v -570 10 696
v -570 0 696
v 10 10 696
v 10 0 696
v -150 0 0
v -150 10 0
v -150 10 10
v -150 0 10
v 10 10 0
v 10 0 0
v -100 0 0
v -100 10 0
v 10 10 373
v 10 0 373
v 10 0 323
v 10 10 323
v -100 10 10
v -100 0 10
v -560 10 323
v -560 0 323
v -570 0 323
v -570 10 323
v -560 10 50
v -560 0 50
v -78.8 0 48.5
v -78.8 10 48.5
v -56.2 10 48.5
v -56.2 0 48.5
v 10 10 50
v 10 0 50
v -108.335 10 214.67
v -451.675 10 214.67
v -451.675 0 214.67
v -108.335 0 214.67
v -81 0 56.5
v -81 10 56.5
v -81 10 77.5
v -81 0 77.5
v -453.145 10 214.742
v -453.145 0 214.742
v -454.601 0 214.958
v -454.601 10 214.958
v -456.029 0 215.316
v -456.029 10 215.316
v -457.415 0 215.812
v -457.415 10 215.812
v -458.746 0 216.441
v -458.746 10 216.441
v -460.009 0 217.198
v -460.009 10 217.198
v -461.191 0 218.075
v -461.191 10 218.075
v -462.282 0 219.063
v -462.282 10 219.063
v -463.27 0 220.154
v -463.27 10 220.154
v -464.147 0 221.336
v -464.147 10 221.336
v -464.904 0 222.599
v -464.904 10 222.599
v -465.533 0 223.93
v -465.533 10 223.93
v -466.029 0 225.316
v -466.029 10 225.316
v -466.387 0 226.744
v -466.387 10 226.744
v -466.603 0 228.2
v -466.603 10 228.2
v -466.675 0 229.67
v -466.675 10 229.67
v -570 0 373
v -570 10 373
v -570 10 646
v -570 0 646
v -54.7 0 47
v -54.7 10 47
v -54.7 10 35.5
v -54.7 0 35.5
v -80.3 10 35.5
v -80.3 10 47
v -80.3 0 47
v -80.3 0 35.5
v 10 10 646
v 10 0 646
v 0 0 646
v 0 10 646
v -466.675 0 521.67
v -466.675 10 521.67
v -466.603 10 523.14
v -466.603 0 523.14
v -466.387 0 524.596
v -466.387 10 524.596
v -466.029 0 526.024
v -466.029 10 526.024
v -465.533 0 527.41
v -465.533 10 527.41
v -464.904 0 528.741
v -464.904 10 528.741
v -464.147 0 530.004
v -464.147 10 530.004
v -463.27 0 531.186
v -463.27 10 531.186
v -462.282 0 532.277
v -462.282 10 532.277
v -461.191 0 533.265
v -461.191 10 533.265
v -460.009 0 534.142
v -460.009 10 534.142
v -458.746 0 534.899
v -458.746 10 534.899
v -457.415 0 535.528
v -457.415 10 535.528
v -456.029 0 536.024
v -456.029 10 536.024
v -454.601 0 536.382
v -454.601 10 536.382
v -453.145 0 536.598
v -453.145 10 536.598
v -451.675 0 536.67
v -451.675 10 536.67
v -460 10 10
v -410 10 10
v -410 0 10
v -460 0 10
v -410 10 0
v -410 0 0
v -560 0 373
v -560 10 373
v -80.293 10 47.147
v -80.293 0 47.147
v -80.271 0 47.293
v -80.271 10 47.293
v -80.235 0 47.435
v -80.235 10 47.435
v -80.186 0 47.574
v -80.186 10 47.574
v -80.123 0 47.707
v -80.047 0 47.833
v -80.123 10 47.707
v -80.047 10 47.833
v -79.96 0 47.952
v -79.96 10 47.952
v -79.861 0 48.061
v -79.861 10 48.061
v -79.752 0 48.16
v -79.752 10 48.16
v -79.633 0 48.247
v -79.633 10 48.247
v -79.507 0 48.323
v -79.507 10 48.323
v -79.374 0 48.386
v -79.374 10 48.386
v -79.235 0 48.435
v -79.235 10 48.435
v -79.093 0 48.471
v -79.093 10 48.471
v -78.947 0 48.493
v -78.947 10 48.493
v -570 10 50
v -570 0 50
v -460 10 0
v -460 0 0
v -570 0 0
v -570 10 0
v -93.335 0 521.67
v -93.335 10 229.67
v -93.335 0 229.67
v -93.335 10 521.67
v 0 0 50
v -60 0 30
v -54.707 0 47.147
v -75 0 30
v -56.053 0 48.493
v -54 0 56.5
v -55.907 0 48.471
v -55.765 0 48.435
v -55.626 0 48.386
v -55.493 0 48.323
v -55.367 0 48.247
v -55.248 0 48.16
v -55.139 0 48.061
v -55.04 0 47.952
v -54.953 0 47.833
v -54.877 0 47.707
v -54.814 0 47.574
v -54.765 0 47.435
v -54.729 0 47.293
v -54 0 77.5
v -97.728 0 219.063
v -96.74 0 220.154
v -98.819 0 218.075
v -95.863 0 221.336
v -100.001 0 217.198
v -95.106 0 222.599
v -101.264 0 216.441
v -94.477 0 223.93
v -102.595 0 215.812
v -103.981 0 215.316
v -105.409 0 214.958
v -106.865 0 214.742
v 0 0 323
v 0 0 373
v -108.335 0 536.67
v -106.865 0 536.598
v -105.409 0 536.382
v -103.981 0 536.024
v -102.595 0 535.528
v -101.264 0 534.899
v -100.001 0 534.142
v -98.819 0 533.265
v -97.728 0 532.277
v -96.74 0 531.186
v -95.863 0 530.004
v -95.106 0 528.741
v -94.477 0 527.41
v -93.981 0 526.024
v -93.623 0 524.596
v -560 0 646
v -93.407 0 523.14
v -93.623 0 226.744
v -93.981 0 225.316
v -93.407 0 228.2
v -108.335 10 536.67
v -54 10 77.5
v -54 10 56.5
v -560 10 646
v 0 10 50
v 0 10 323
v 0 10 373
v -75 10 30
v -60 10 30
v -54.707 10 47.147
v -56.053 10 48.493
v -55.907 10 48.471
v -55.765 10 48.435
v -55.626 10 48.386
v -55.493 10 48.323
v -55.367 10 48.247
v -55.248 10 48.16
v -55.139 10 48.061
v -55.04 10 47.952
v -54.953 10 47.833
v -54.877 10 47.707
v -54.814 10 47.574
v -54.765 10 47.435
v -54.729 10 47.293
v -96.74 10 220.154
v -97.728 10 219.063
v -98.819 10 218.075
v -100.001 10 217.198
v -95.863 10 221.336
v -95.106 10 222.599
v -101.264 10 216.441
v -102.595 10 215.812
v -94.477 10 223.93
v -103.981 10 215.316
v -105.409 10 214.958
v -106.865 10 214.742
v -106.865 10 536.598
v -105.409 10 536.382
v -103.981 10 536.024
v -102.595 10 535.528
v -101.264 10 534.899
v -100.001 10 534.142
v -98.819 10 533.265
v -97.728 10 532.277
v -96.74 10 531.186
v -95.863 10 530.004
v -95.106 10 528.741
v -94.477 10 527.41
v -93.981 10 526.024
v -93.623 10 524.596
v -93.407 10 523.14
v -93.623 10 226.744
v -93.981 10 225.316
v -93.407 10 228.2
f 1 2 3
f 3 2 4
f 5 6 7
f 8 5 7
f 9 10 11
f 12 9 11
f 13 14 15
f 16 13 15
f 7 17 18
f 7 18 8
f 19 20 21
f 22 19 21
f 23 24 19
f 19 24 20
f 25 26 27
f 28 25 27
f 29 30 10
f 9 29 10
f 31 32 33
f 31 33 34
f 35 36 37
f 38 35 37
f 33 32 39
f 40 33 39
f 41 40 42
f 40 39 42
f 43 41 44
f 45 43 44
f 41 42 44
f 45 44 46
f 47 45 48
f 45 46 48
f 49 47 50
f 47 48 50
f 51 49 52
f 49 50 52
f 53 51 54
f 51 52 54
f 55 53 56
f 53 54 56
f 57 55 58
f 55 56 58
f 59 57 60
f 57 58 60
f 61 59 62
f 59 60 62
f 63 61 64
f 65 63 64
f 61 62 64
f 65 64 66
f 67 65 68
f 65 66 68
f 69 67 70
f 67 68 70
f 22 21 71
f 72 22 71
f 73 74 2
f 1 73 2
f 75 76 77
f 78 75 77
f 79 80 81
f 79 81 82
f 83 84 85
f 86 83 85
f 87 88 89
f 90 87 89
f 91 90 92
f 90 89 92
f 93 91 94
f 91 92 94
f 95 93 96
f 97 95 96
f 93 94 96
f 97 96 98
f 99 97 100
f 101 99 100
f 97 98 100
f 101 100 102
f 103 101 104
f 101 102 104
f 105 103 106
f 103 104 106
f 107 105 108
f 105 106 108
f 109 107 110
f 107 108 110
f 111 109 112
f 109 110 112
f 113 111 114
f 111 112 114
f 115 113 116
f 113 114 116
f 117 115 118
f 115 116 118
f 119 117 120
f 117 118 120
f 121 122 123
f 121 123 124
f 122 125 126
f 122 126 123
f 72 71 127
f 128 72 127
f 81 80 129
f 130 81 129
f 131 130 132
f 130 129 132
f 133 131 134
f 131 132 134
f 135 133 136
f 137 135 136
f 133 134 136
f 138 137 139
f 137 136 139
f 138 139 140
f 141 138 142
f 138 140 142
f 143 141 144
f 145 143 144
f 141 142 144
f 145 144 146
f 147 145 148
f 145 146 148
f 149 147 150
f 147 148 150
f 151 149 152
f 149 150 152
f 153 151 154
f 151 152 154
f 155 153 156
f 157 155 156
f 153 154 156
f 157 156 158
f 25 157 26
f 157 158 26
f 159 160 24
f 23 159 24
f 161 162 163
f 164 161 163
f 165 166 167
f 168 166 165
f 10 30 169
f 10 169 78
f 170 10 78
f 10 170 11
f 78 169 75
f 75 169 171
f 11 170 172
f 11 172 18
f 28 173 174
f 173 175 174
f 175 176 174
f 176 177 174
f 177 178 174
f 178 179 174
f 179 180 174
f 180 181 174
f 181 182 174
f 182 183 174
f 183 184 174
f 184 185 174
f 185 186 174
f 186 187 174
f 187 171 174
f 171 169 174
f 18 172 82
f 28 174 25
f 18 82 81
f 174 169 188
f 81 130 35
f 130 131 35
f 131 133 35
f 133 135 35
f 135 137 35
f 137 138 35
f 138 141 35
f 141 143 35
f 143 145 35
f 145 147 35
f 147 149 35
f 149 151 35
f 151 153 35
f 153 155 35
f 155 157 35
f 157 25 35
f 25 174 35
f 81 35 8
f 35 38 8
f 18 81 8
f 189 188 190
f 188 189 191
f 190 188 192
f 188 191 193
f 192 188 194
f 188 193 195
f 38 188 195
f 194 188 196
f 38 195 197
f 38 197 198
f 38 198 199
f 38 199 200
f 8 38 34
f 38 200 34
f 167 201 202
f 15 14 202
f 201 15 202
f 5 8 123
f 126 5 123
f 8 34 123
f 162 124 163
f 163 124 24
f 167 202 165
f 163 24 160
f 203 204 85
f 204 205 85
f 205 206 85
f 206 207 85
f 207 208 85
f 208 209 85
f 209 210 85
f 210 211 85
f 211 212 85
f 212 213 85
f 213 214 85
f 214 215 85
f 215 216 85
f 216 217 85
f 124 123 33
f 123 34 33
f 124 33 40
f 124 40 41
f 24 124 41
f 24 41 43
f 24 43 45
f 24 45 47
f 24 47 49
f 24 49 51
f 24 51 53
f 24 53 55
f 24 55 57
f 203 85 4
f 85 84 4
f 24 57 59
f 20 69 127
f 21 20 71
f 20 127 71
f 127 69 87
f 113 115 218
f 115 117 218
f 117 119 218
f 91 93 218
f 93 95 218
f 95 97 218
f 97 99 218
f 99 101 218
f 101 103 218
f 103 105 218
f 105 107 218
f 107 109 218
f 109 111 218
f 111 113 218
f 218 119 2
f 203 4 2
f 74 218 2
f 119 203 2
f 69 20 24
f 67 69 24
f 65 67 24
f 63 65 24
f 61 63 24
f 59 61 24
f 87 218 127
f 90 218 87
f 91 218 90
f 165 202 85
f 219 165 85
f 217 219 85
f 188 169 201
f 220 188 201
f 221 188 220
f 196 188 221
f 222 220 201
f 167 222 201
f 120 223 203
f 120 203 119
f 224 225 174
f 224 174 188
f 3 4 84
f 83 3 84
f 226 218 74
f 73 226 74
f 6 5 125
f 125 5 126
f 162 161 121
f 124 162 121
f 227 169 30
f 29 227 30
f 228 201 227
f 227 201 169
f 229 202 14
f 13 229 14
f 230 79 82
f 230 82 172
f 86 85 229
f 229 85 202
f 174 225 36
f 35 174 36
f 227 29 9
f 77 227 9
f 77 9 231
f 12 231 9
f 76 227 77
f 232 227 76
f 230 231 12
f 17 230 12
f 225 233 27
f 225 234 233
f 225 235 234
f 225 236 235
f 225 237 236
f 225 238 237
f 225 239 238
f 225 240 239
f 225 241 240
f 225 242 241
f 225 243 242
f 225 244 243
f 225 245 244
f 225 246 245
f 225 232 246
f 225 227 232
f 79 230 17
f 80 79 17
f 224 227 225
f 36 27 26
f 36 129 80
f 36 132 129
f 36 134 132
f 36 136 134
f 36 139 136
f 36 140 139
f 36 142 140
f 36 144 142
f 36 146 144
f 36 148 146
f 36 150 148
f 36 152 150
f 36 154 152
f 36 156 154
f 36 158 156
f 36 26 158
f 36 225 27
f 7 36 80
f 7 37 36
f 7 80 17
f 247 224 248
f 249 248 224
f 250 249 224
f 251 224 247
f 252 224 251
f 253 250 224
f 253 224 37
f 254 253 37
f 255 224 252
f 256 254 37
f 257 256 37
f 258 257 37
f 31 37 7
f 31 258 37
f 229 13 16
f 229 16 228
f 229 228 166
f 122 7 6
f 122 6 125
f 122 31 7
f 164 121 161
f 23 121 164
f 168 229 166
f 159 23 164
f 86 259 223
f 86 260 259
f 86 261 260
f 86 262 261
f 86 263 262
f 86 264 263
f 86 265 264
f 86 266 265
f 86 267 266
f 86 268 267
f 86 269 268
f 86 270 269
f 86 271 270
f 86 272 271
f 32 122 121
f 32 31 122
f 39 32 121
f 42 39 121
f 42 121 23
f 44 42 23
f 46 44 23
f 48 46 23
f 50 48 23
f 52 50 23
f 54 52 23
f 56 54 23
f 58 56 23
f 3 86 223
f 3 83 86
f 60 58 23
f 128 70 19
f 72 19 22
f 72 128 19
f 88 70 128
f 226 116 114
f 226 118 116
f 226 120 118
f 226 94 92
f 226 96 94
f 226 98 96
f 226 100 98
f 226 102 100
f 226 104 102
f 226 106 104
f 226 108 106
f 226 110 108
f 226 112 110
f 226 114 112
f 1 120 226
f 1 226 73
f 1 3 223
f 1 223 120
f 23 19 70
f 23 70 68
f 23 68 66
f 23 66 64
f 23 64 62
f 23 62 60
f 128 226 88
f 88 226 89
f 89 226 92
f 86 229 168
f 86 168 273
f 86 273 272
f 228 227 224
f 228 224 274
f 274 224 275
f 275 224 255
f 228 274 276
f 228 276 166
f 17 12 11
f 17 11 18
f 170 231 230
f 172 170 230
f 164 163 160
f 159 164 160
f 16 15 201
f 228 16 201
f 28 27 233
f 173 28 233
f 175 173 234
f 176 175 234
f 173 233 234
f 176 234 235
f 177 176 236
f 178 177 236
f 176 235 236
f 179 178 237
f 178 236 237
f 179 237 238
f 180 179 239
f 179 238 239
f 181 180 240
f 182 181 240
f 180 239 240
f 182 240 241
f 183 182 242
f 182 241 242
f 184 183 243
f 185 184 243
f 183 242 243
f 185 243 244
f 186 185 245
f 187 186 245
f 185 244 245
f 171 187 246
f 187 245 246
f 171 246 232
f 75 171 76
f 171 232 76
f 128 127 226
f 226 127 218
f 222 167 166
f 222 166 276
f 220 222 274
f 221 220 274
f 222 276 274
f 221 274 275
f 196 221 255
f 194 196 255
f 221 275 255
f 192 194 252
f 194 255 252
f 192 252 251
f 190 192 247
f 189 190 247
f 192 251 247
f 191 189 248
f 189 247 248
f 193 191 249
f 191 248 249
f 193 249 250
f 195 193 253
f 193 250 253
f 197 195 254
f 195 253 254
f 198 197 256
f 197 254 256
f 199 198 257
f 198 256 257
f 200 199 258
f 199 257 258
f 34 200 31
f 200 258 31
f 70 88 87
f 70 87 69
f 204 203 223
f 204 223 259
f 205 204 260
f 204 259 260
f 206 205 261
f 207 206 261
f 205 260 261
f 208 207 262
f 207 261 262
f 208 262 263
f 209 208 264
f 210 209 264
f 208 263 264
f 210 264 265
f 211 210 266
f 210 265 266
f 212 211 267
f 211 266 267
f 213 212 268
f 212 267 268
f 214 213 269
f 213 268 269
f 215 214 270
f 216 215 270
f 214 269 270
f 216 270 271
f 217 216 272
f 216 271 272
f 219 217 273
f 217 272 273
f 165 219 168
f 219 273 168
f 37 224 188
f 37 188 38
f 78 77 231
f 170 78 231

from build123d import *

# Parameters (mm, degrees)
PAD_DEPTH     = 10
SKETCH001_W   = 27
SKETCH001_H   = 21
SKETCH001_W_2 = 50
SKETCH001_H_2 = 10
POCKET_DEPTH  = 10.001


with BuildPart() as part:
    # Sketch → Pad (new body)
    with BuildSketch(Plane(origin=(0, 0, 0), x_dir=(-1, 0, 0), z_dir=(0, 1, 0))):
        Polygon((0, 0), (560, 0), (570, 0), (570, 50), (560, 50), (560, 323), (570, 323), (570, 373), (560, 373), (560, 646), (570, 646), (570, 696), (560, 696), (0, 696), (-10, 696), (-10, 646), (0, 646), (0, 373), (-10, 373), (-10, 323), (0, 323), (0, 50), (-10, 50), (-10, 0), align=None)
    extrude(amount=PAD_DEPTH)

    # Sketch001 → Pocket (cut, through all)
    with BuildSketch(Plane(origin=(0, 10, 0), x_dir=(-1, 0, 0), z_dir=(0, 1, 0))):
        with BuildLine():
            Line((108.335, 536.67), (451.675, 536.67))
            ThreePointArc((466.675, 521.67), (462.281602, 532.276602), (451.675, 536.67))
            Line((466.675, 521.67), (466.675, 229.67))
            ThreePointArc((451.675, 214.67), (462.281602, 219.063398), (466.675, 229.67))
            Line((451.675, 214.67), (108.335, 214.67))
            ThreePointArc((93.335, 229.67), (97.728398, 219.063398), (108.335, 214.67))
            Line((93.335, 229.67), (93.335, 521.67))
            ThreePointArc((108.335, 536.67), (97.728398, 532.276602), (93.335, 521.67))
        make_face()
        with BuildLine():
            Line((60, 30), (75, 30))
            Line((80.3, 35.5), (75, 30))
            Line((80.3, 47), (80.3, 35.5))
            ThreePointArc((80.3, 47), (79.86066, 48.06066), (78.8, 48.5))
            Line((78.8, 48.5), (56.2, 48.5))
            ThreePointArc((56.2, 48.5), (55.13934, 48.06066), (54.7, 47))
            Line((54.7, 47), (54.7, 35.5))
            Line((54.7, 35.5), (60, 30))
        make_face()
        with Locations((67.5, 67)):
            Rectangle(SKETCH001_W, SKETCH001_H)
        with Locations((125, 5)):
            Rectangle(SKETCH001_W_2, SKETCH001_H_2)
        with Locations((435, 5)):
            Rectangle(SKETCH001_W_2, SKETCH001_H_2)
    extrude(amount=-POCKET_DEPTH, mode=Mode.SUBTRACT)


solid = part.part
